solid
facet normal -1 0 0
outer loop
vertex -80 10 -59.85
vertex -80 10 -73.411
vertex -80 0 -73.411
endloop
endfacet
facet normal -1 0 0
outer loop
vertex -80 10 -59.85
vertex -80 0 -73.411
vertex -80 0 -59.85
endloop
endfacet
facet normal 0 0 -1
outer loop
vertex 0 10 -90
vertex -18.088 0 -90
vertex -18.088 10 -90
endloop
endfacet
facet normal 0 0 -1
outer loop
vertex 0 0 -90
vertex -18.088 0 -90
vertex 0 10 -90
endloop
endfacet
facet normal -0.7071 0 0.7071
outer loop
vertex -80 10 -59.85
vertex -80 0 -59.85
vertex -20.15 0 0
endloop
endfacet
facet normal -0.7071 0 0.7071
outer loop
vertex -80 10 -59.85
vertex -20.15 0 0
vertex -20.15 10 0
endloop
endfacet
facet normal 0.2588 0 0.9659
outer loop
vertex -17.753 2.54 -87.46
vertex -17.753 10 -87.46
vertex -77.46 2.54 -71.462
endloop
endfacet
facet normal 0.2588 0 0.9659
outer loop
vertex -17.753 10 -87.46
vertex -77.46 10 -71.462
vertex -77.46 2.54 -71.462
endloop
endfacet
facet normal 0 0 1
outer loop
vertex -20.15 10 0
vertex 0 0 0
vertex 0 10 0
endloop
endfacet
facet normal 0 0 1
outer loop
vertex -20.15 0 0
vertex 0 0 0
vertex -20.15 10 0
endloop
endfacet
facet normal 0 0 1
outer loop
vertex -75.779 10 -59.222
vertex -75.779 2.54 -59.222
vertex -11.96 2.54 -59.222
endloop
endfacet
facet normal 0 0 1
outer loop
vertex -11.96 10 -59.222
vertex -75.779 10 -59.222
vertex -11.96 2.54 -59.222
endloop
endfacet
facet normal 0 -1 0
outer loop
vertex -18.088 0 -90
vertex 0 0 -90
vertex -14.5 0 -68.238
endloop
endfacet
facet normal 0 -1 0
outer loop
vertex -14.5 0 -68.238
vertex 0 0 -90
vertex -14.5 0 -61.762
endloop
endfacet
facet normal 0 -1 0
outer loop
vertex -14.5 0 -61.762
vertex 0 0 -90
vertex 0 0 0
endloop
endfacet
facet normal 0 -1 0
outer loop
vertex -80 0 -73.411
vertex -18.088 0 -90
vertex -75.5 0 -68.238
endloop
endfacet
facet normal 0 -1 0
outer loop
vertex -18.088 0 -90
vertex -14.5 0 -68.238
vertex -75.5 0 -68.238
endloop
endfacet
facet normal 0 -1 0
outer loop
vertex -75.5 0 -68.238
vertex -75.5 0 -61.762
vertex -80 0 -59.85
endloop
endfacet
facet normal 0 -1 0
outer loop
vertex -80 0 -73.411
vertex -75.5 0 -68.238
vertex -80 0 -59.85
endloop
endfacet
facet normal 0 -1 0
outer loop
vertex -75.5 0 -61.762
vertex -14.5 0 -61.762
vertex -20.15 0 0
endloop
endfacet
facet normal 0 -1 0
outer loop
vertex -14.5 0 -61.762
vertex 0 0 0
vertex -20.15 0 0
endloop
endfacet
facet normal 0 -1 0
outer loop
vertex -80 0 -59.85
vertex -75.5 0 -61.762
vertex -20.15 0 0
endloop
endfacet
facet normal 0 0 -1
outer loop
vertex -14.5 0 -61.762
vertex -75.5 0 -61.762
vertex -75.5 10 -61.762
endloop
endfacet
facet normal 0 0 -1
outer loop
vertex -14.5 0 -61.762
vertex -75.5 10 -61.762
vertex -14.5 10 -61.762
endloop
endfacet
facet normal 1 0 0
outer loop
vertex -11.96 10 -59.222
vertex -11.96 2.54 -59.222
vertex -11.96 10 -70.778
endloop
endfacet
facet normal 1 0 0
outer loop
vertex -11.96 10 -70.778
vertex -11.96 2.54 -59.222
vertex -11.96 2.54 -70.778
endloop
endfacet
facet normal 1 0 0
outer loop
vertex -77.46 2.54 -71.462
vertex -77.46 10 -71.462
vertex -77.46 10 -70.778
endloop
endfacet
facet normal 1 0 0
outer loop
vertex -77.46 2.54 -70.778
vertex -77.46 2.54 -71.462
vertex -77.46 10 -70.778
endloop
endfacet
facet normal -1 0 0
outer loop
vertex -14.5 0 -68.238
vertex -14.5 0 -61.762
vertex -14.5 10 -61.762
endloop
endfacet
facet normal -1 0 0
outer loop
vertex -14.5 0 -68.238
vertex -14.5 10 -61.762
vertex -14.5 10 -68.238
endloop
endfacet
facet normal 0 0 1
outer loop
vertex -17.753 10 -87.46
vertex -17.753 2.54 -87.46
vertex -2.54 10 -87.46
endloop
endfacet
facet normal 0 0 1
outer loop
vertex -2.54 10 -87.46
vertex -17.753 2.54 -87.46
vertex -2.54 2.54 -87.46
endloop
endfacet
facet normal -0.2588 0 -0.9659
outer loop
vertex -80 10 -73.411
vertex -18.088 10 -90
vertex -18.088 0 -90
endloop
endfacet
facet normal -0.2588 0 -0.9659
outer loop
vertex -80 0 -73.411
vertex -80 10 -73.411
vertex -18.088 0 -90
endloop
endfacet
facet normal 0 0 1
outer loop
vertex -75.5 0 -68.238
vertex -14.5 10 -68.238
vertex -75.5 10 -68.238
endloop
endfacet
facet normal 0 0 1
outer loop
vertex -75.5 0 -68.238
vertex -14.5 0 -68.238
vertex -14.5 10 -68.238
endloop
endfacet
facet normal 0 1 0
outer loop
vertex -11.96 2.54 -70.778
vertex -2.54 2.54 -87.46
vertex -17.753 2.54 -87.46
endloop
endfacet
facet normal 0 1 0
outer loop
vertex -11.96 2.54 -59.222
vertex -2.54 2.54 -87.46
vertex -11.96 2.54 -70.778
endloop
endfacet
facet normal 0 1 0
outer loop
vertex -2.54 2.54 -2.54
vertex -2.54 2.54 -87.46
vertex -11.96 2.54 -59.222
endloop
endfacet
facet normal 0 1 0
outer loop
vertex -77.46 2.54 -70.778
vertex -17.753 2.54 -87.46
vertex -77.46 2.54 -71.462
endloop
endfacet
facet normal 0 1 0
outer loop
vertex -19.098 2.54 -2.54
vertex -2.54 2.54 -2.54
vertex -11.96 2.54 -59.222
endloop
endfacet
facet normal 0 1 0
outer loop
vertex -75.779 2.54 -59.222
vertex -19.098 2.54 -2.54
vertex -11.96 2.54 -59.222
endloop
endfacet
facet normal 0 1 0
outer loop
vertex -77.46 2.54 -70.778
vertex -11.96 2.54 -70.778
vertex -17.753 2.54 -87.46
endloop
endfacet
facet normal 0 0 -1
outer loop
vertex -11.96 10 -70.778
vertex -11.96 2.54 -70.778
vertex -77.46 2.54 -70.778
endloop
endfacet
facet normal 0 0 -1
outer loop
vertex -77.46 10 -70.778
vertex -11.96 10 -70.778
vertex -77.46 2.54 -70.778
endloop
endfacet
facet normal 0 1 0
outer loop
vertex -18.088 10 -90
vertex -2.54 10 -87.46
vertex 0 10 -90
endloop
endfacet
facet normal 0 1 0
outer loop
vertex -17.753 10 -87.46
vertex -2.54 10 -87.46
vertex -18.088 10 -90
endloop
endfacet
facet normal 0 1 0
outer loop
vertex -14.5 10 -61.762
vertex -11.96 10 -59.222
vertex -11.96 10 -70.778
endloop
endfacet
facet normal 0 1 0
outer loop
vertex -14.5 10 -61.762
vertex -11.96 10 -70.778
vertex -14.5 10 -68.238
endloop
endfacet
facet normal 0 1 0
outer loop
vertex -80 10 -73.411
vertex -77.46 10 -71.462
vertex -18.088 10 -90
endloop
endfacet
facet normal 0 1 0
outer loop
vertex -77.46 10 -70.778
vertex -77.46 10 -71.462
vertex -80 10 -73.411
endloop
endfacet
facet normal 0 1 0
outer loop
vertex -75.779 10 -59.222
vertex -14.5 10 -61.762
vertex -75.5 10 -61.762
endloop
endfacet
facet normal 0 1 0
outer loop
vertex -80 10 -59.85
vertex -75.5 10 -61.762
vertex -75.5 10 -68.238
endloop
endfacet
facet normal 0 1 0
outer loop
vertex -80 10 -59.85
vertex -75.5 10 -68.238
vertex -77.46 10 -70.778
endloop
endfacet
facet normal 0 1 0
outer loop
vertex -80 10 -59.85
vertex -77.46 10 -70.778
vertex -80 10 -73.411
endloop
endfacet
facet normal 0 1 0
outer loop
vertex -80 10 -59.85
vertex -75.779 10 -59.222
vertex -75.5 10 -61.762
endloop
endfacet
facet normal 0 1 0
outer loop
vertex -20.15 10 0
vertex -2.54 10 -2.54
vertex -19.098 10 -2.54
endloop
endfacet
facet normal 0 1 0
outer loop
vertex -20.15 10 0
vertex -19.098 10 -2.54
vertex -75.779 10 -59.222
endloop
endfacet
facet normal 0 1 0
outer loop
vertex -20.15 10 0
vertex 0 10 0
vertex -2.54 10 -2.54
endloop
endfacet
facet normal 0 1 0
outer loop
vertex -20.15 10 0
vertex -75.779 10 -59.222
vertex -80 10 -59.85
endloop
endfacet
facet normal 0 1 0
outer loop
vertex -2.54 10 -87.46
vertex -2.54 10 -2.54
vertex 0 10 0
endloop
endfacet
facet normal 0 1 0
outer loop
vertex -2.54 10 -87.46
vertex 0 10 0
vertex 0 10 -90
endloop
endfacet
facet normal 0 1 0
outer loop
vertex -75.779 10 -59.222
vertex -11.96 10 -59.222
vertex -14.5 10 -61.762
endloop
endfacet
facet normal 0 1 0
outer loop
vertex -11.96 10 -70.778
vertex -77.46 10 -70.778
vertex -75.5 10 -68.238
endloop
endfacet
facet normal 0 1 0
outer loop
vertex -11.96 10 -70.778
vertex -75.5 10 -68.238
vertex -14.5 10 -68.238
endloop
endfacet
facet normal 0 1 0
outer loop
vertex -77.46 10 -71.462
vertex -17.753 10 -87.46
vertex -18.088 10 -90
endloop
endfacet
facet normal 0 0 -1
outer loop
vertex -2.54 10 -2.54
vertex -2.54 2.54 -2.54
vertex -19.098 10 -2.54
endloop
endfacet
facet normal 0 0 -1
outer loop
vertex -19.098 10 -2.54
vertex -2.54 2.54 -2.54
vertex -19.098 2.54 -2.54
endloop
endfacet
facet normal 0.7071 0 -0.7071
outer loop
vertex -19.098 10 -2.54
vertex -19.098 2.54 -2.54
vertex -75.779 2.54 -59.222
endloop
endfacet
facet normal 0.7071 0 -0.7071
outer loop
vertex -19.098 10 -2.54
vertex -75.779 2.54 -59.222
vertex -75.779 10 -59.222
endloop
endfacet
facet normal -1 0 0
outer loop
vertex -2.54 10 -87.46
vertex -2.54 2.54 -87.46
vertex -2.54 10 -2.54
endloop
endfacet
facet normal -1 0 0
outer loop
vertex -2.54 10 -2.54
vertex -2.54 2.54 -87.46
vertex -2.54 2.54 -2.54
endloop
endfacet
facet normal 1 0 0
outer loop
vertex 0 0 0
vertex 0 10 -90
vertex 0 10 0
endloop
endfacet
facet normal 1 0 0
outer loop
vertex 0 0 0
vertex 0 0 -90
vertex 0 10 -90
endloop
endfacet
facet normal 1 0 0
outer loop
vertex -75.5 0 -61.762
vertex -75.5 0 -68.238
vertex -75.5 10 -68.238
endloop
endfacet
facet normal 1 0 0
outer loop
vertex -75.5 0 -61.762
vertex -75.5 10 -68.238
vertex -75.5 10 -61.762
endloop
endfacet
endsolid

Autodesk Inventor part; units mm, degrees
ref_plane "YZ Plane" through (0, 0, 0) normal (1, 0, 0) x (0, 1, 0)
ref_plane "XZ Plane" through (0, 0, 0) normal (0, 1, 0) x (-1, 0, 0)
ref_plane "XY Plane" through (0, 0, 0) normal (0, 0, 1) x (1, 0, 0)
sketch "Sketch1" plane through (0, 0, 0) normal (0, 1, 0) x (-1, 0, 0)
  line L0 (0, 0) -> (90, 0)
  line L1 (90, 0) -> (90, -90)
  line L2 (90, -90) -> (0, -90)
  line L3 (0, -90) -> (0, 0)
  line L4 (0, 0) -> (90, 0)
  line L5 (90, 0) -> (90, -65)
  line L6 (90, -65) -> (0, -65)
  line L7 (0, -65) -> (0, 0)
  line L8 (14.5, -68.2385) -> (75.5, -68.2385)
  line L9 (75.5, -68.2385) -> (75.5, -61.7615)
  line L10 (75.5, -61.7615) -> (14.5, -61.7615)
  line L11 (14.5, -61.7615) -> (14.5, -68.2385)
  line L12 (14.5, -68.2385) -> (75.5, -61.7615) construction
  line L13 (75.5, -68.2385) -> (14.5, -61.7615) construction
  line L14 (14.5, -68.2385) -> (75.5, -68.2385) construction
  point P0 (45, -65)
  dimension "d16" = 90
  dimension "d17" = 90
  dimension "d18" = 90
  dimension "d19" = 65
  dimension "d20" = 61
  dimension "d21" = 0
  dimension "d22" = 6.477
extrude "Extrusion1" add sketch "Sketch1" along normal blind 10 contours L0 L1 L6 L9 L10 L11 L3 | L6 L11 L8 L9 L1 L2 L3
chamfer "Chamfer1" distance 69.85 angle 45 1 edges at (-90, 5, 0)
sketch "Sketch2" plane through (-90, 0, -69.85) normal (-1, 0, 0) x (0, 0, 1)
  line L0 (69.85, 10) -> (0, 10) projected
  line L1 (0, 10) -> (0, 0) projected
  line L2 (0, 0) -> (69.85, 0) projected
  line L3 (69.85, 0) -> (69.85, 10) projected
  line L4 (-20.15, 0) -> (0, 0) projected
  line L5 (0, 10) -> (0, 0) projected
  line L6 (-20.15, 10) -> (0, 10) projected
  line L7 (-7.8336, 10) -> (-20.15, 10) projected
  line L8 (-20.15, 10) -> (-20.15, 0) projected
  line L9 (-20.15, 0) -> (-7.8336, 0) projected
  line L10 (-7.8336, 0) -> (-7.8336, 10) projected
  line L11 (-20.15, 0) -> (-20.15, 10) projected
extrude "Extrusion2" cut sketch "Sketch2" against normal blind 10
chamfer "Chamfer3" distance 61.9125 angle 15 1 edges at (-80, 5, -90) measured on face at (-26.6667, 6.6667, -90)
shell "Shell1" thickness 2.54 removed faces 1 at (-36.7167, 10, -41.1743)
properties part number "Speaker Stand"
